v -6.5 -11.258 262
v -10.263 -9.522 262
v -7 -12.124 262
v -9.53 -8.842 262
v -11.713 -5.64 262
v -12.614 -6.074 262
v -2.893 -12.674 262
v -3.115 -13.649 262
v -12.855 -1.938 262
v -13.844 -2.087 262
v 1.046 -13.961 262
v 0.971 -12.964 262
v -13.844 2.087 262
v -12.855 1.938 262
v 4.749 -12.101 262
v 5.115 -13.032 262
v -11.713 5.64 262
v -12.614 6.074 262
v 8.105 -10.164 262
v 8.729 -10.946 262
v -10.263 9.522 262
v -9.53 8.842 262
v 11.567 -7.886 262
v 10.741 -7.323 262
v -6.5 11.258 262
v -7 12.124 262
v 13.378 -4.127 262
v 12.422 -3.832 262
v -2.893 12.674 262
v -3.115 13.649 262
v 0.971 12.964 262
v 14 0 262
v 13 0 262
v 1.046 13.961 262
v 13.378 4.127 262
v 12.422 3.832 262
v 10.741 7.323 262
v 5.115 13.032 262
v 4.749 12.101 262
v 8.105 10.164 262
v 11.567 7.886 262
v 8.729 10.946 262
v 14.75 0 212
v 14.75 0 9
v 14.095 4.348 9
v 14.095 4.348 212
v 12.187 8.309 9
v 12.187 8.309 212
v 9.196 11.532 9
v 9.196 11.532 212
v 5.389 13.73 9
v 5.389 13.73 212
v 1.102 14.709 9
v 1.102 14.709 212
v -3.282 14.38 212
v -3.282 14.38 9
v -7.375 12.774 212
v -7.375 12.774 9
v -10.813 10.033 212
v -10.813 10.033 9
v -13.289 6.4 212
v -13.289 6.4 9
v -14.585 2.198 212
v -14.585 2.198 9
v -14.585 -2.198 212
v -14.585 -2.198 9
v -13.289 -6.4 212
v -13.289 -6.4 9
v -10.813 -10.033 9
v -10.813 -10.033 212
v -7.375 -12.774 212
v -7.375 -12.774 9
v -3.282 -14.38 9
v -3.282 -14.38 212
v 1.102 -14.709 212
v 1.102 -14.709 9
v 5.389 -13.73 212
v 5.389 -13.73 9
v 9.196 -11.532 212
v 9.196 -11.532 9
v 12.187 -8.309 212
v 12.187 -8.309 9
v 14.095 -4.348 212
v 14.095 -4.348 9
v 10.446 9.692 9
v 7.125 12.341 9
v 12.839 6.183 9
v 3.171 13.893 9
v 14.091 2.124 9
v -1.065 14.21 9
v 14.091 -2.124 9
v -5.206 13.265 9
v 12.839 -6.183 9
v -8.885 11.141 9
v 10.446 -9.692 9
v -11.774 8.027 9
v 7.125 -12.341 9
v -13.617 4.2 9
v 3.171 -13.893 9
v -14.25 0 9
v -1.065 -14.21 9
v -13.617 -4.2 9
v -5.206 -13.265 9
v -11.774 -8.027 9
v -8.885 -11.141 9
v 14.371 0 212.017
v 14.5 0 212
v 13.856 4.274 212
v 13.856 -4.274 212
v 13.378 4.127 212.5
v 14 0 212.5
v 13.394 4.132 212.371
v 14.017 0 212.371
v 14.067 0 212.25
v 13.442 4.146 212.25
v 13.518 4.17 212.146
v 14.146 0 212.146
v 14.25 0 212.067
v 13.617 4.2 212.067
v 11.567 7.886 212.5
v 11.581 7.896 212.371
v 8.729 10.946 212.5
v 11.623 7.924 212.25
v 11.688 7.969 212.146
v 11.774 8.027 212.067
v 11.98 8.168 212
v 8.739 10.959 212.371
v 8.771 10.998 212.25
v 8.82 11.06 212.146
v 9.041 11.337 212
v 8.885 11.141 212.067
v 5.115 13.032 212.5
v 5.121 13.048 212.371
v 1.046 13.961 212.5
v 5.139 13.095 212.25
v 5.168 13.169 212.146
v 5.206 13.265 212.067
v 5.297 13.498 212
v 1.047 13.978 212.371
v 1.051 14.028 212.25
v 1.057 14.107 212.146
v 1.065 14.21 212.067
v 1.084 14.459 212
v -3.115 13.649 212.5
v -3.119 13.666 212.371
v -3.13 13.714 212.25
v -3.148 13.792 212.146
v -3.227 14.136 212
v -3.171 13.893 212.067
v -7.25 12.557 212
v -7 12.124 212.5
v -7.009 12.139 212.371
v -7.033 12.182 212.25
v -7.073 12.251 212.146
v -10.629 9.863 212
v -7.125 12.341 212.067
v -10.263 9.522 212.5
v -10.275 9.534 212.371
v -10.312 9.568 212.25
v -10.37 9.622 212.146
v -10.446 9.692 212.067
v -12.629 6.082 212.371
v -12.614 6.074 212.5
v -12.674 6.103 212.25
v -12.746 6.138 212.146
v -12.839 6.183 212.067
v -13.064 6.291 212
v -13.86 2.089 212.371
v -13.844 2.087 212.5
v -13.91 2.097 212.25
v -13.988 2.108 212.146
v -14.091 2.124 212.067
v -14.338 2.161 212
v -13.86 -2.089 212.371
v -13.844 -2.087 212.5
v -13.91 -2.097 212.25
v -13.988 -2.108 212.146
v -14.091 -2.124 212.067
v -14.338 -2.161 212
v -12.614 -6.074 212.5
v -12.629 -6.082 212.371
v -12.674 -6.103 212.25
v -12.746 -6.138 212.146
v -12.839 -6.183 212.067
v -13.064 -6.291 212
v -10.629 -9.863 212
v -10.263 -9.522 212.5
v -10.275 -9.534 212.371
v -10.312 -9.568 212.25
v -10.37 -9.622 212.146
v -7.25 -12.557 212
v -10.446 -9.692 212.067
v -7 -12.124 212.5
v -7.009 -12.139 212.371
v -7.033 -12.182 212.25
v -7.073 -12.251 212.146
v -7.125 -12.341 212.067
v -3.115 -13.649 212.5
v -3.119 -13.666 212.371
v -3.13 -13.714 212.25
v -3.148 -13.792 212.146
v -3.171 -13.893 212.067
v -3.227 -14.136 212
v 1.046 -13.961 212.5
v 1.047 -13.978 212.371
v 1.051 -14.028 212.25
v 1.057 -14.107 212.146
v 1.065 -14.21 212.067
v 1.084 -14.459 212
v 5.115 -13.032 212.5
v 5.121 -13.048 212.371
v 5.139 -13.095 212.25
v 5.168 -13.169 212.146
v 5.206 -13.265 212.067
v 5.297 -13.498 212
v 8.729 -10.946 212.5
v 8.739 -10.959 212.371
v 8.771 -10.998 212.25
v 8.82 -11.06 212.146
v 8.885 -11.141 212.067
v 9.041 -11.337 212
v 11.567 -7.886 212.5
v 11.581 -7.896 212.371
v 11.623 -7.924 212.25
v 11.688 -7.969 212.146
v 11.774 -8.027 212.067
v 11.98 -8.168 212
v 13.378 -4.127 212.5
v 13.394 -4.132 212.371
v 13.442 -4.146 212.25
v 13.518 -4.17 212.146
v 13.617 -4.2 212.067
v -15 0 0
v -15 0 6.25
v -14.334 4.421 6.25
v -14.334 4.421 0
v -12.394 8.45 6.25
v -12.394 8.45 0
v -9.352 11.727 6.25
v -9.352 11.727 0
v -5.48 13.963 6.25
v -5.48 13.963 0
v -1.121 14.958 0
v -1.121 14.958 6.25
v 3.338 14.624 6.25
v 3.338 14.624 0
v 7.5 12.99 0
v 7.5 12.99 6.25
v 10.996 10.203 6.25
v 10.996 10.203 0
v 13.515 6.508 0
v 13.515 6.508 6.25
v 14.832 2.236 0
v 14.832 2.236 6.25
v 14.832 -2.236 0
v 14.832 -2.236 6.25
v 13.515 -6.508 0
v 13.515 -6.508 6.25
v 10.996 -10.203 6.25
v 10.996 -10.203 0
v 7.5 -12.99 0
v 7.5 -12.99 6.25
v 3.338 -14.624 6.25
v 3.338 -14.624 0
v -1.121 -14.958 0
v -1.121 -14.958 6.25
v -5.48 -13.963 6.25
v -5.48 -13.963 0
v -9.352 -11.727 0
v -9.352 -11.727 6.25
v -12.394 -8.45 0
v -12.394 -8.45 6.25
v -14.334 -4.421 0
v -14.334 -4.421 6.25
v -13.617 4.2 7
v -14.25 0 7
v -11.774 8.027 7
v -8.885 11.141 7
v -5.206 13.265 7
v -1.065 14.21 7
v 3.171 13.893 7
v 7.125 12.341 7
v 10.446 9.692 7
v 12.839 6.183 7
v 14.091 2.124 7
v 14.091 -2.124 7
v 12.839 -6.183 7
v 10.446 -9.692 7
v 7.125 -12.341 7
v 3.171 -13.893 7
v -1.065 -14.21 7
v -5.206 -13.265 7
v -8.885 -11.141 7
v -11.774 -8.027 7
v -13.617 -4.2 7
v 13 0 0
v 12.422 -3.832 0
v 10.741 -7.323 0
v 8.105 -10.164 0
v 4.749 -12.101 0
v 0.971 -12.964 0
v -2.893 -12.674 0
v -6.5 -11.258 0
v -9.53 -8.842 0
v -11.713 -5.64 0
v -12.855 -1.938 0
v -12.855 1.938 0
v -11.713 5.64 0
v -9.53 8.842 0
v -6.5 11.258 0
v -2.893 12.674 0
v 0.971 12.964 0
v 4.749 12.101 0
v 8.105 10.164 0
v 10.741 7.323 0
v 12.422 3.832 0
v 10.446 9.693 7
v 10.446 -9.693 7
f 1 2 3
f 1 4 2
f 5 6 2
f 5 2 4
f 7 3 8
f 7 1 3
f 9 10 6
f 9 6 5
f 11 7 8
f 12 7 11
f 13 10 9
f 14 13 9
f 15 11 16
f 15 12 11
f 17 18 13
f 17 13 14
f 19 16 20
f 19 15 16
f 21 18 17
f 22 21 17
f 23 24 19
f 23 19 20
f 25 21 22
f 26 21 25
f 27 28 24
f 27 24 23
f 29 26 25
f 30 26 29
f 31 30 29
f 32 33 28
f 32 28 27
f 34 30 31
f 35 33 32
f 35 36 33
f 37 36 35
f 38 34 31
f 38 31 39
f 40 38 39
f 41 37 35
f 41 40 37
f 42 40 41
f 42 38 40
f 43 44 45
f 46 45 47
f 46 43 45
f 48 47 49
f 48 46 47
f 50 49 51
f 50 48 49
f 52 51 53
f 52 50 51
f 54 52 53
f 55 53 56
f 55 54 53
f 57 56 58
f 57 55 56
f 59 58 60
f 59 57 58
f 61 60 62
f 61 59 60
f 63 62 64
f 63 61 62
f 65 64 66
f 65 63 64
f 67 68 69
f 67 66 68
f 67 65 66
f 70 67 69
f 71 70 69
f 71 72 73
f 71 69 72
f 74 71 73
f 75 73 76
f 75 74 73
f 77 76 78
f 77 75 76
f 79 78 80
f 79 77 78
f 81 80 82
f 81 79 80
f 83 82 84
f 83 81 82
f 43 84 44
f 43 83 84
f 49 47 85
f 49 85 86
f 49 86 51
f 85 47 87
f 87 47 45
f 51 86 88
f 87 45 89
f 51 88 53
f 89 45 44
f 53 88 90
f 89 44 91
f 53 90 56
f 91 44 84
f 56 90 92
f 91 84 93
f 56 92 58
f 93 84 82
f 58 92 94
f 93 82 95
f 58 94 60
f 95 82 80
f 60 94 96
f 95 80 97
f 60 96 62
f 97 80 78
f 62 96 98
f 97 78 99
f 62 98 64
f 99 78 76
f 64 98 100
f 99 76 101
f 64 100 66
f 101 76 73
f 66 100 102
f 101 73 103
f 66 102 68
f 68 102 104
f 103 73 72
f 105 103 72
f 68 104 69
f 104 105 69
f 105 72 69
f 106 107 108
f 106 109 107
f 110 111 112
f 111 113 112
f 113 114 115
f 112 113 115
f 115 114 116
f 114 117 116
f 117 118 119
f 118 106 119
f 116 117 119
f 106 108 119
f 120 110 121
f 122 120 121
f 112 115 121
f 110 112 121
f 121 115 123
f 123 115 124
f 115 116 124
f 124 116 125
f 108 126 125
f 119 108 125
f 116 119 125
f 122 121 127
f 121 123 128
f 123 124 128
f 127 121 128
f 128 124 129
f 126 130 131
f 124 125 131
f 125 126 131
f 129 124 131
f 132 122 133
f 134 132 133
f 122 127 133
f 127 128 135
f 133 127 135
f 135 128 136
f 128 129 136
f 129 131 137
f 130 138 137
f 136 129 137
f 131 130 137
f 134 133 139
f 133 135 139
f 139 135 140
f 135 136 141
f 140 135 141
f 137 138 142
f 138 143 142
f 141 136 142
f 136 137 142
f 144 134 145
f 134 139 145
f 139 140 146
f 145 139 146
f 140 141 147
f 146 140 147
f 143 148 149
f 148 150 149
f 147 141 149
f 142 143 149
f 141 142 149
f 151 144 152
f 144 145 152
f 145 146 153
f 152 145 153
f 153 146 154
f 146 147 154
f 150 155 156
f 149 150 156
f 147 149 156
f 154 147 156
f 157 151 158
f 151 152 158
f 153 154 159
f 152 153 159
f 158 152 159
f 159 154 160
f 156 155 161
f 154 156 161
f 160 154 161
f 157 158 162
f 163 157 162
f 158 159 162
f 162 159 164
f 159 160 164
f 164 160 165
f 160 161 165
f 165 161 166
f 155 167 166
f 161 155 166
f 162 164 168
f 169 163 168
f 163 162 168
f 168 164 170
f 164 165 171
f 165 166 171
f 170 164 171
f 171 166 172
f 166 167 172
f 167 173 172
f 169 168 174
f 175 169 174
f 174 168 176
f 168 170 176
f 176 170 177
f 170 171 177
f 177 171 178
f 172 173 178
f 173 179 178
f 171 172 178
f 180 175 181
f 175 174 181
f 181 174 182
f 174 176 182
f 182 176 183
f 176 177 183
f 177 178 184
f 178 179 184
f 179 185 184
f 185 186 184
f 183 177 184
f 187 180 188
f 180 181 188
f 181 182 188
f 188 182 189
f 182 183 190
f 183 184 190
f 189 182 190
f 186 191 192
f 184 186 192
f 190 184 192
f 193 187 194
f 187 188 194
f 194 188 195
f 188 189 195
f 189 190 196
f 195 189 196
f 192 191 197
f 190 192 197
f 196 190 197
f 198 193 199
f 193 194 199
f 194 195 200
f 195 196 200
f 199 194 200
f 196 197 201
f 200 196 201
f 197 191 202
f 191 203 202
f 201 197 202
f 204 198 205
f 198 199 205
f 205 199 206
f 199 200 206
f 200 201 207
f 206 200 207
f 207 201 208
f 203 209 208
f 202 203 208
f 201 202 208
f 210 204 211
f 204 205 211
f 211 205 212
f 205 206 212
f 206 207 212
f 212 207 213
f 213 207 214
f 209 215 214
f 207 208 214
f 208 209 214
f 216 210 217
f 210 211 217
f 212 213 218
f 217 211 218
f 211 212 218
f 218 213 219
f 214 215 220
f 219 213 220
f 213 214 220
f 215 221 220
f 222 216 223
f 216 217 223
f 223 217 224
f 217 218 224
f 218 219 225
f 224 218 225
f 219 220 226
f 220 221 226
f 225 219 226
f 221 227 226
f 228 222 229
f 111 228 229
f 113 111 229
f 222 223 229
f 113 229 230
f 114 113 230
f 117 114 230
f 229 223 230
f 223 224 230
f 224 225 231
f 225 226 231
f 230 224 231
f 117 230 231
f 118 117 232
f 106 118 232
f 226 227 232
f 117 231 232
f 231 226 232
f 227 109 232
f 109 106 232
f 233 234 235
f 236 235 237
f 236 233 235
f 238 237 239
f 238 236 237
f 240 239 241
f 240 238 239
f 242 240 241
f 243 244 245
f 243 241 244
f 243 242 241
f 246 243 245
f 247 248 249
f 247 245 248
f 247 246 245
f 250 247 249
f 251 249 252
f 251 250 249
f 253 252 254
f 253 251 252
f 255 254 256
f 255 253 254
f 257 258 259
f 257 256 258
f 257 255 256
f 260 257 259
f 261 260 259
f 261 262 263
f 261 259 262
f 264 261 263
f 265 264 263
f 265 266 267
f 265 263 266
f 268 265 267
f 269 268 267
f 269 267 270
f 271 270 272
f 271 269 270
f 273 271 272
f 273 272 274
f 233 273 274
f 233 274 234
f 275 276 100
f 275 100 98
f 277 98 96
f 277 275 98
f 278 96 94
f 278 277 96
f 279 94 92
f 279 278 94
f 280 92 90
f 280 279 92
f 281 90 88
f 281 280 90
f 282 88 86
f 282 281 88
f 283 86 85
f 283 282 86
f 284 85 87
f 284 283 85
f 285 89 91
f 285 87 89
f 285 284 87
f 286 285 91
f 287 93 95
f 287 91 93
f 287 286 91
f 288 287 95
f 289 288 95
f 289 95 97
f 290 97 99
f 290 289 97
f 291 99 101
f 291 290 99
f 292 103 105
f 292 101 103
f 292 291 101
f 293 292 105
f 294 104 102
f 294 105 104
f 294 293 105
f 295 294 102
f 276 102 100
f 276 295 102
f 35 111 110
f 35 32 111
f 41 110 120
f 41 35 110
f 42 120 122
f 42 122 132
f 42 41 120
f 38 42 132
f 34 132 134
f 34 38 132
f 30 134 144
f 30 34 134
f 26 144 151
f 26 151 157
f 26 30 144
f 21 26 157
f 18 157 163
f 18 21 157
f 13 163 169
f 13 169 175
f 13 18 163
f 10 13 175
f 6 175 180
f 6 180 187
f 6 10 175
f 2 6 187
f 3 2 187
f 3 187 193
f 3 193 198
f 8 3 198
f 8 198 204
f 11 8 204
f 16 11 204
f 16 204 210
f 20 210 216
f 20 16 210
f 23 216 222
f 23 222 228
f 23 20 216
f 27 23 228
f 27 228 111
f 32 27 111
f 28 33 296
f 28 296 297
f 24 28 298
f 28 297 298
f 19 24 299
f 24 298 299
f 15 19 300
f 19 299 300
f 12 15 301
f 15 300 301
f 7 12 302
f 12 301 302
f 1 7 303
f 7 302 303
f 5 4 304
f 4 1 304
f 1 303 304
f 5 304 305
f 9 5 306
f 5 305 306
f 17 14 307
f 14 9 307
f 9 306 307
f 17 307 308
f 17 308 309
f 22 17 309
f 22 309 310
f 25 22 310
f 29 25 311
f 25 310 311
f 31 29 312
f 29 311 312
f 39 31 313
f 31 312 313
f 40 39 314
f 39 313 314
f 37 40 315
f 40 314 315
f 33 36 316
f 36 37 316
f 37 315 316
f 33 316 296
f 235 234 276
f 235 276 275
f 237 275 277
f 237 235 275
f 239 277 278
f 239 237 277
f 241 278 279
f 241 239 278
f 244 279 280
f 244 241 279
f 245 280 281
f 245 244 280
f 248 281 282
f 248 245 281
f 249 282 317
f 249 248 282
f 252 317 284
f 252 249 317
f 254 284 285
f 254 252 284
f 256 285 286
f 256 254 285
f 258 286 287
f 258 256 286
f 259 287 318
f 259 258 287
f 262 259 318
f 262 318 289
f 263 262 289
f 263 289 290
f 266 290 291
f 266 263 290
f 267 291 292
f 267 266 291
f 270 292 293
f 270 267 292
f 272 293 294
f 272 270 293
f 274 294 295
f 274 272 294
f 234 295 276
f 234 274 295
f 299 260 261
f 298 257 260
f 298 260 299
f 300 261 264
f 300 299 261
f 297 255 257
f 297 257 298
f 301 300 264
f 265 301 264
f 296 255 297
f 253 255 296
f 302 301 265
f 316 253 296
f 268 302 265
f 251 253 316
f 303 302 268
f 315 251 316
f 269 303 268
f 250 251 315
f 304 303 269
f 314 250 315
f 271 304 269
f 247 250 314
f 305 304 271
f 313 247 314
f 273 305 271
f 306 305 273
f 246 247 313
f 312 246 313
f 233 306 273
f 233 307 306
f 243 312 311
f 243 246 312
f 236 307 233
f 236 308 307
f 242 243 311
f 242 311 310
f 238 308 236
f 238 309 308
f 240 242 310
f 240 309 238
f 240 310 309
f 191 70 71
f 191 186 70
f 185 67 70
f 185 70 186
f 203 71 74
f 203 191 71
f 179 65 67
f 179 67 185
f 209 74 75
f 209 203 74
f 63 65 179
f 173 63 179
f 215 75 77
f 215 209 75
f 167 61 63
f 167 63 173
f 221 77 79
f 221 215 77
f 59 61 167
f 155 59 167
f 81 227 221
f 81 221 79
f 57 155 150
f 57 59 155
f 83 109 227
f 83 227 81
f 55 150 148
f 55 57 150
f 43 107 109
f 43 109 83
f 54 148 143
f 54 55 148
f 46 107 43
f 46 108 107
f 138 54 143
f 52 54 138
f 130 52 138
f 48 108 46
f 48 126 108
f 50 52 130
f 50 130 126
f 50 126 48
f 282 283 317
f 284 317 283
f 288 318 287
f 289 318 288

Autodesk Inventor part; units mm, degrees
ref_plane "YZ Plane" through (0, 0, 0) normal (1, 0, 0) x (0, 1, 0)
ref_plane "XZ Plane" through (0, 0, 0) normal (0, 1, 0) x (-1, 0, 0)
ref_plane "XY Plane" through (0, 0, 0) normal (0, 0, 1) x (1, 0, 0)
sketch "Skizze1" plane through (0, 0, 0) normal (0, 0, 1) x (1, 0, 0)
  circle A0 centre (0, 0) radius 13
  circle A1 centre (0, 0) radius 15
  dimension "d0" = 30
  dimension "d1" = 2
extrude "Extrusion1" add sketch "Skizze1" along normal blind 262
sketch "Skizze2" plane through (0, 0, 262) normal (0, 0, 1) x (1, 0, 0)
  circle A0 centre (0, 0) radius 15 projected
  circle A1 centre (0, 0) radius 14.75
  dimension "d4" = 29.5
extrude "Extrusion2" cut sketch "Skizze2" against normal through all
sketch "Skizze3" plane through (0, 0, 0) normal (0, 0, -1) x (-1, 0, 0)
  circle A0 centre (0, 0) radius 14.75 projected
  circle A1 centre (0, 0) radius 13 projected
  circle A2 centre (0, 0) radius 15
  dimension "d7" = 30
extrude "Extrusion3" add sketch "Skizze3" against normal blind 9 contours A2
sketch "Skizze4" plane through (0, 0, 262) normal (0, 0, 1) x (1, 0, 0)
  circle A0 centre (0, 0) radius 14.75 projected
  circle A1 centre (0, 0) radius 13 projected
  circle A2 centre (0, 0) radius 14
  dimension "d10" = 28
extrude "Extrusion4" cut sketch "Skizze4" against normal blind 50 contours A0
sketch "Skizze5" plane through (0, 0, 0) normal (0, 1, 0) x (-1, 0, 0)
  line L0 (-15, 9) -> (15, 9) projected
  line L1 (15, 0) -> (-15, 0) projected
  line L2 (14.75, 9) -> (-14.75, 9) projected
  line L3 (15, 0) -> (15, 9) projected
  line L4 (13, 0) -> (13, 262) projected
  line L5 (14.75, 212) -> (14.75, 9) projected
  line L6 (15, 9) -> (14.25, 9)
  line L7 (14.25, 9) -> (14.25, 7)
  line L8 (14.25, 7) -> (15, 7)
  line L9 (15, 7) -> (15, 9)
  line L10 (21, 0) -> (-21, 0) projected
  line L11 (0, -50) -> (0, 300) projected
  point P0 (0, 0)
  point P1 (-9.75, 200)
  point P2 (9.75, 200)
  dimension "d13" = 2
  dimension "d14" = 28.5
revolve "Umdrehung1" cut sketch "Skizze5" angle 360 about axis through (0, 0, -10) along (0, 0, 1) contours L0 L3 L8 L7
chamfer "Fase1" distance 0.75 angle 45 1 edges at (15, 0, 7)
thread "Gewinde4" size "M30x1" class "6g" standard "ANSI Metric M Profile" full length
fillet "Rundung1" radius 0.5 1 edges at (-14, 0, 212)
properties part number "13_0204_026"
